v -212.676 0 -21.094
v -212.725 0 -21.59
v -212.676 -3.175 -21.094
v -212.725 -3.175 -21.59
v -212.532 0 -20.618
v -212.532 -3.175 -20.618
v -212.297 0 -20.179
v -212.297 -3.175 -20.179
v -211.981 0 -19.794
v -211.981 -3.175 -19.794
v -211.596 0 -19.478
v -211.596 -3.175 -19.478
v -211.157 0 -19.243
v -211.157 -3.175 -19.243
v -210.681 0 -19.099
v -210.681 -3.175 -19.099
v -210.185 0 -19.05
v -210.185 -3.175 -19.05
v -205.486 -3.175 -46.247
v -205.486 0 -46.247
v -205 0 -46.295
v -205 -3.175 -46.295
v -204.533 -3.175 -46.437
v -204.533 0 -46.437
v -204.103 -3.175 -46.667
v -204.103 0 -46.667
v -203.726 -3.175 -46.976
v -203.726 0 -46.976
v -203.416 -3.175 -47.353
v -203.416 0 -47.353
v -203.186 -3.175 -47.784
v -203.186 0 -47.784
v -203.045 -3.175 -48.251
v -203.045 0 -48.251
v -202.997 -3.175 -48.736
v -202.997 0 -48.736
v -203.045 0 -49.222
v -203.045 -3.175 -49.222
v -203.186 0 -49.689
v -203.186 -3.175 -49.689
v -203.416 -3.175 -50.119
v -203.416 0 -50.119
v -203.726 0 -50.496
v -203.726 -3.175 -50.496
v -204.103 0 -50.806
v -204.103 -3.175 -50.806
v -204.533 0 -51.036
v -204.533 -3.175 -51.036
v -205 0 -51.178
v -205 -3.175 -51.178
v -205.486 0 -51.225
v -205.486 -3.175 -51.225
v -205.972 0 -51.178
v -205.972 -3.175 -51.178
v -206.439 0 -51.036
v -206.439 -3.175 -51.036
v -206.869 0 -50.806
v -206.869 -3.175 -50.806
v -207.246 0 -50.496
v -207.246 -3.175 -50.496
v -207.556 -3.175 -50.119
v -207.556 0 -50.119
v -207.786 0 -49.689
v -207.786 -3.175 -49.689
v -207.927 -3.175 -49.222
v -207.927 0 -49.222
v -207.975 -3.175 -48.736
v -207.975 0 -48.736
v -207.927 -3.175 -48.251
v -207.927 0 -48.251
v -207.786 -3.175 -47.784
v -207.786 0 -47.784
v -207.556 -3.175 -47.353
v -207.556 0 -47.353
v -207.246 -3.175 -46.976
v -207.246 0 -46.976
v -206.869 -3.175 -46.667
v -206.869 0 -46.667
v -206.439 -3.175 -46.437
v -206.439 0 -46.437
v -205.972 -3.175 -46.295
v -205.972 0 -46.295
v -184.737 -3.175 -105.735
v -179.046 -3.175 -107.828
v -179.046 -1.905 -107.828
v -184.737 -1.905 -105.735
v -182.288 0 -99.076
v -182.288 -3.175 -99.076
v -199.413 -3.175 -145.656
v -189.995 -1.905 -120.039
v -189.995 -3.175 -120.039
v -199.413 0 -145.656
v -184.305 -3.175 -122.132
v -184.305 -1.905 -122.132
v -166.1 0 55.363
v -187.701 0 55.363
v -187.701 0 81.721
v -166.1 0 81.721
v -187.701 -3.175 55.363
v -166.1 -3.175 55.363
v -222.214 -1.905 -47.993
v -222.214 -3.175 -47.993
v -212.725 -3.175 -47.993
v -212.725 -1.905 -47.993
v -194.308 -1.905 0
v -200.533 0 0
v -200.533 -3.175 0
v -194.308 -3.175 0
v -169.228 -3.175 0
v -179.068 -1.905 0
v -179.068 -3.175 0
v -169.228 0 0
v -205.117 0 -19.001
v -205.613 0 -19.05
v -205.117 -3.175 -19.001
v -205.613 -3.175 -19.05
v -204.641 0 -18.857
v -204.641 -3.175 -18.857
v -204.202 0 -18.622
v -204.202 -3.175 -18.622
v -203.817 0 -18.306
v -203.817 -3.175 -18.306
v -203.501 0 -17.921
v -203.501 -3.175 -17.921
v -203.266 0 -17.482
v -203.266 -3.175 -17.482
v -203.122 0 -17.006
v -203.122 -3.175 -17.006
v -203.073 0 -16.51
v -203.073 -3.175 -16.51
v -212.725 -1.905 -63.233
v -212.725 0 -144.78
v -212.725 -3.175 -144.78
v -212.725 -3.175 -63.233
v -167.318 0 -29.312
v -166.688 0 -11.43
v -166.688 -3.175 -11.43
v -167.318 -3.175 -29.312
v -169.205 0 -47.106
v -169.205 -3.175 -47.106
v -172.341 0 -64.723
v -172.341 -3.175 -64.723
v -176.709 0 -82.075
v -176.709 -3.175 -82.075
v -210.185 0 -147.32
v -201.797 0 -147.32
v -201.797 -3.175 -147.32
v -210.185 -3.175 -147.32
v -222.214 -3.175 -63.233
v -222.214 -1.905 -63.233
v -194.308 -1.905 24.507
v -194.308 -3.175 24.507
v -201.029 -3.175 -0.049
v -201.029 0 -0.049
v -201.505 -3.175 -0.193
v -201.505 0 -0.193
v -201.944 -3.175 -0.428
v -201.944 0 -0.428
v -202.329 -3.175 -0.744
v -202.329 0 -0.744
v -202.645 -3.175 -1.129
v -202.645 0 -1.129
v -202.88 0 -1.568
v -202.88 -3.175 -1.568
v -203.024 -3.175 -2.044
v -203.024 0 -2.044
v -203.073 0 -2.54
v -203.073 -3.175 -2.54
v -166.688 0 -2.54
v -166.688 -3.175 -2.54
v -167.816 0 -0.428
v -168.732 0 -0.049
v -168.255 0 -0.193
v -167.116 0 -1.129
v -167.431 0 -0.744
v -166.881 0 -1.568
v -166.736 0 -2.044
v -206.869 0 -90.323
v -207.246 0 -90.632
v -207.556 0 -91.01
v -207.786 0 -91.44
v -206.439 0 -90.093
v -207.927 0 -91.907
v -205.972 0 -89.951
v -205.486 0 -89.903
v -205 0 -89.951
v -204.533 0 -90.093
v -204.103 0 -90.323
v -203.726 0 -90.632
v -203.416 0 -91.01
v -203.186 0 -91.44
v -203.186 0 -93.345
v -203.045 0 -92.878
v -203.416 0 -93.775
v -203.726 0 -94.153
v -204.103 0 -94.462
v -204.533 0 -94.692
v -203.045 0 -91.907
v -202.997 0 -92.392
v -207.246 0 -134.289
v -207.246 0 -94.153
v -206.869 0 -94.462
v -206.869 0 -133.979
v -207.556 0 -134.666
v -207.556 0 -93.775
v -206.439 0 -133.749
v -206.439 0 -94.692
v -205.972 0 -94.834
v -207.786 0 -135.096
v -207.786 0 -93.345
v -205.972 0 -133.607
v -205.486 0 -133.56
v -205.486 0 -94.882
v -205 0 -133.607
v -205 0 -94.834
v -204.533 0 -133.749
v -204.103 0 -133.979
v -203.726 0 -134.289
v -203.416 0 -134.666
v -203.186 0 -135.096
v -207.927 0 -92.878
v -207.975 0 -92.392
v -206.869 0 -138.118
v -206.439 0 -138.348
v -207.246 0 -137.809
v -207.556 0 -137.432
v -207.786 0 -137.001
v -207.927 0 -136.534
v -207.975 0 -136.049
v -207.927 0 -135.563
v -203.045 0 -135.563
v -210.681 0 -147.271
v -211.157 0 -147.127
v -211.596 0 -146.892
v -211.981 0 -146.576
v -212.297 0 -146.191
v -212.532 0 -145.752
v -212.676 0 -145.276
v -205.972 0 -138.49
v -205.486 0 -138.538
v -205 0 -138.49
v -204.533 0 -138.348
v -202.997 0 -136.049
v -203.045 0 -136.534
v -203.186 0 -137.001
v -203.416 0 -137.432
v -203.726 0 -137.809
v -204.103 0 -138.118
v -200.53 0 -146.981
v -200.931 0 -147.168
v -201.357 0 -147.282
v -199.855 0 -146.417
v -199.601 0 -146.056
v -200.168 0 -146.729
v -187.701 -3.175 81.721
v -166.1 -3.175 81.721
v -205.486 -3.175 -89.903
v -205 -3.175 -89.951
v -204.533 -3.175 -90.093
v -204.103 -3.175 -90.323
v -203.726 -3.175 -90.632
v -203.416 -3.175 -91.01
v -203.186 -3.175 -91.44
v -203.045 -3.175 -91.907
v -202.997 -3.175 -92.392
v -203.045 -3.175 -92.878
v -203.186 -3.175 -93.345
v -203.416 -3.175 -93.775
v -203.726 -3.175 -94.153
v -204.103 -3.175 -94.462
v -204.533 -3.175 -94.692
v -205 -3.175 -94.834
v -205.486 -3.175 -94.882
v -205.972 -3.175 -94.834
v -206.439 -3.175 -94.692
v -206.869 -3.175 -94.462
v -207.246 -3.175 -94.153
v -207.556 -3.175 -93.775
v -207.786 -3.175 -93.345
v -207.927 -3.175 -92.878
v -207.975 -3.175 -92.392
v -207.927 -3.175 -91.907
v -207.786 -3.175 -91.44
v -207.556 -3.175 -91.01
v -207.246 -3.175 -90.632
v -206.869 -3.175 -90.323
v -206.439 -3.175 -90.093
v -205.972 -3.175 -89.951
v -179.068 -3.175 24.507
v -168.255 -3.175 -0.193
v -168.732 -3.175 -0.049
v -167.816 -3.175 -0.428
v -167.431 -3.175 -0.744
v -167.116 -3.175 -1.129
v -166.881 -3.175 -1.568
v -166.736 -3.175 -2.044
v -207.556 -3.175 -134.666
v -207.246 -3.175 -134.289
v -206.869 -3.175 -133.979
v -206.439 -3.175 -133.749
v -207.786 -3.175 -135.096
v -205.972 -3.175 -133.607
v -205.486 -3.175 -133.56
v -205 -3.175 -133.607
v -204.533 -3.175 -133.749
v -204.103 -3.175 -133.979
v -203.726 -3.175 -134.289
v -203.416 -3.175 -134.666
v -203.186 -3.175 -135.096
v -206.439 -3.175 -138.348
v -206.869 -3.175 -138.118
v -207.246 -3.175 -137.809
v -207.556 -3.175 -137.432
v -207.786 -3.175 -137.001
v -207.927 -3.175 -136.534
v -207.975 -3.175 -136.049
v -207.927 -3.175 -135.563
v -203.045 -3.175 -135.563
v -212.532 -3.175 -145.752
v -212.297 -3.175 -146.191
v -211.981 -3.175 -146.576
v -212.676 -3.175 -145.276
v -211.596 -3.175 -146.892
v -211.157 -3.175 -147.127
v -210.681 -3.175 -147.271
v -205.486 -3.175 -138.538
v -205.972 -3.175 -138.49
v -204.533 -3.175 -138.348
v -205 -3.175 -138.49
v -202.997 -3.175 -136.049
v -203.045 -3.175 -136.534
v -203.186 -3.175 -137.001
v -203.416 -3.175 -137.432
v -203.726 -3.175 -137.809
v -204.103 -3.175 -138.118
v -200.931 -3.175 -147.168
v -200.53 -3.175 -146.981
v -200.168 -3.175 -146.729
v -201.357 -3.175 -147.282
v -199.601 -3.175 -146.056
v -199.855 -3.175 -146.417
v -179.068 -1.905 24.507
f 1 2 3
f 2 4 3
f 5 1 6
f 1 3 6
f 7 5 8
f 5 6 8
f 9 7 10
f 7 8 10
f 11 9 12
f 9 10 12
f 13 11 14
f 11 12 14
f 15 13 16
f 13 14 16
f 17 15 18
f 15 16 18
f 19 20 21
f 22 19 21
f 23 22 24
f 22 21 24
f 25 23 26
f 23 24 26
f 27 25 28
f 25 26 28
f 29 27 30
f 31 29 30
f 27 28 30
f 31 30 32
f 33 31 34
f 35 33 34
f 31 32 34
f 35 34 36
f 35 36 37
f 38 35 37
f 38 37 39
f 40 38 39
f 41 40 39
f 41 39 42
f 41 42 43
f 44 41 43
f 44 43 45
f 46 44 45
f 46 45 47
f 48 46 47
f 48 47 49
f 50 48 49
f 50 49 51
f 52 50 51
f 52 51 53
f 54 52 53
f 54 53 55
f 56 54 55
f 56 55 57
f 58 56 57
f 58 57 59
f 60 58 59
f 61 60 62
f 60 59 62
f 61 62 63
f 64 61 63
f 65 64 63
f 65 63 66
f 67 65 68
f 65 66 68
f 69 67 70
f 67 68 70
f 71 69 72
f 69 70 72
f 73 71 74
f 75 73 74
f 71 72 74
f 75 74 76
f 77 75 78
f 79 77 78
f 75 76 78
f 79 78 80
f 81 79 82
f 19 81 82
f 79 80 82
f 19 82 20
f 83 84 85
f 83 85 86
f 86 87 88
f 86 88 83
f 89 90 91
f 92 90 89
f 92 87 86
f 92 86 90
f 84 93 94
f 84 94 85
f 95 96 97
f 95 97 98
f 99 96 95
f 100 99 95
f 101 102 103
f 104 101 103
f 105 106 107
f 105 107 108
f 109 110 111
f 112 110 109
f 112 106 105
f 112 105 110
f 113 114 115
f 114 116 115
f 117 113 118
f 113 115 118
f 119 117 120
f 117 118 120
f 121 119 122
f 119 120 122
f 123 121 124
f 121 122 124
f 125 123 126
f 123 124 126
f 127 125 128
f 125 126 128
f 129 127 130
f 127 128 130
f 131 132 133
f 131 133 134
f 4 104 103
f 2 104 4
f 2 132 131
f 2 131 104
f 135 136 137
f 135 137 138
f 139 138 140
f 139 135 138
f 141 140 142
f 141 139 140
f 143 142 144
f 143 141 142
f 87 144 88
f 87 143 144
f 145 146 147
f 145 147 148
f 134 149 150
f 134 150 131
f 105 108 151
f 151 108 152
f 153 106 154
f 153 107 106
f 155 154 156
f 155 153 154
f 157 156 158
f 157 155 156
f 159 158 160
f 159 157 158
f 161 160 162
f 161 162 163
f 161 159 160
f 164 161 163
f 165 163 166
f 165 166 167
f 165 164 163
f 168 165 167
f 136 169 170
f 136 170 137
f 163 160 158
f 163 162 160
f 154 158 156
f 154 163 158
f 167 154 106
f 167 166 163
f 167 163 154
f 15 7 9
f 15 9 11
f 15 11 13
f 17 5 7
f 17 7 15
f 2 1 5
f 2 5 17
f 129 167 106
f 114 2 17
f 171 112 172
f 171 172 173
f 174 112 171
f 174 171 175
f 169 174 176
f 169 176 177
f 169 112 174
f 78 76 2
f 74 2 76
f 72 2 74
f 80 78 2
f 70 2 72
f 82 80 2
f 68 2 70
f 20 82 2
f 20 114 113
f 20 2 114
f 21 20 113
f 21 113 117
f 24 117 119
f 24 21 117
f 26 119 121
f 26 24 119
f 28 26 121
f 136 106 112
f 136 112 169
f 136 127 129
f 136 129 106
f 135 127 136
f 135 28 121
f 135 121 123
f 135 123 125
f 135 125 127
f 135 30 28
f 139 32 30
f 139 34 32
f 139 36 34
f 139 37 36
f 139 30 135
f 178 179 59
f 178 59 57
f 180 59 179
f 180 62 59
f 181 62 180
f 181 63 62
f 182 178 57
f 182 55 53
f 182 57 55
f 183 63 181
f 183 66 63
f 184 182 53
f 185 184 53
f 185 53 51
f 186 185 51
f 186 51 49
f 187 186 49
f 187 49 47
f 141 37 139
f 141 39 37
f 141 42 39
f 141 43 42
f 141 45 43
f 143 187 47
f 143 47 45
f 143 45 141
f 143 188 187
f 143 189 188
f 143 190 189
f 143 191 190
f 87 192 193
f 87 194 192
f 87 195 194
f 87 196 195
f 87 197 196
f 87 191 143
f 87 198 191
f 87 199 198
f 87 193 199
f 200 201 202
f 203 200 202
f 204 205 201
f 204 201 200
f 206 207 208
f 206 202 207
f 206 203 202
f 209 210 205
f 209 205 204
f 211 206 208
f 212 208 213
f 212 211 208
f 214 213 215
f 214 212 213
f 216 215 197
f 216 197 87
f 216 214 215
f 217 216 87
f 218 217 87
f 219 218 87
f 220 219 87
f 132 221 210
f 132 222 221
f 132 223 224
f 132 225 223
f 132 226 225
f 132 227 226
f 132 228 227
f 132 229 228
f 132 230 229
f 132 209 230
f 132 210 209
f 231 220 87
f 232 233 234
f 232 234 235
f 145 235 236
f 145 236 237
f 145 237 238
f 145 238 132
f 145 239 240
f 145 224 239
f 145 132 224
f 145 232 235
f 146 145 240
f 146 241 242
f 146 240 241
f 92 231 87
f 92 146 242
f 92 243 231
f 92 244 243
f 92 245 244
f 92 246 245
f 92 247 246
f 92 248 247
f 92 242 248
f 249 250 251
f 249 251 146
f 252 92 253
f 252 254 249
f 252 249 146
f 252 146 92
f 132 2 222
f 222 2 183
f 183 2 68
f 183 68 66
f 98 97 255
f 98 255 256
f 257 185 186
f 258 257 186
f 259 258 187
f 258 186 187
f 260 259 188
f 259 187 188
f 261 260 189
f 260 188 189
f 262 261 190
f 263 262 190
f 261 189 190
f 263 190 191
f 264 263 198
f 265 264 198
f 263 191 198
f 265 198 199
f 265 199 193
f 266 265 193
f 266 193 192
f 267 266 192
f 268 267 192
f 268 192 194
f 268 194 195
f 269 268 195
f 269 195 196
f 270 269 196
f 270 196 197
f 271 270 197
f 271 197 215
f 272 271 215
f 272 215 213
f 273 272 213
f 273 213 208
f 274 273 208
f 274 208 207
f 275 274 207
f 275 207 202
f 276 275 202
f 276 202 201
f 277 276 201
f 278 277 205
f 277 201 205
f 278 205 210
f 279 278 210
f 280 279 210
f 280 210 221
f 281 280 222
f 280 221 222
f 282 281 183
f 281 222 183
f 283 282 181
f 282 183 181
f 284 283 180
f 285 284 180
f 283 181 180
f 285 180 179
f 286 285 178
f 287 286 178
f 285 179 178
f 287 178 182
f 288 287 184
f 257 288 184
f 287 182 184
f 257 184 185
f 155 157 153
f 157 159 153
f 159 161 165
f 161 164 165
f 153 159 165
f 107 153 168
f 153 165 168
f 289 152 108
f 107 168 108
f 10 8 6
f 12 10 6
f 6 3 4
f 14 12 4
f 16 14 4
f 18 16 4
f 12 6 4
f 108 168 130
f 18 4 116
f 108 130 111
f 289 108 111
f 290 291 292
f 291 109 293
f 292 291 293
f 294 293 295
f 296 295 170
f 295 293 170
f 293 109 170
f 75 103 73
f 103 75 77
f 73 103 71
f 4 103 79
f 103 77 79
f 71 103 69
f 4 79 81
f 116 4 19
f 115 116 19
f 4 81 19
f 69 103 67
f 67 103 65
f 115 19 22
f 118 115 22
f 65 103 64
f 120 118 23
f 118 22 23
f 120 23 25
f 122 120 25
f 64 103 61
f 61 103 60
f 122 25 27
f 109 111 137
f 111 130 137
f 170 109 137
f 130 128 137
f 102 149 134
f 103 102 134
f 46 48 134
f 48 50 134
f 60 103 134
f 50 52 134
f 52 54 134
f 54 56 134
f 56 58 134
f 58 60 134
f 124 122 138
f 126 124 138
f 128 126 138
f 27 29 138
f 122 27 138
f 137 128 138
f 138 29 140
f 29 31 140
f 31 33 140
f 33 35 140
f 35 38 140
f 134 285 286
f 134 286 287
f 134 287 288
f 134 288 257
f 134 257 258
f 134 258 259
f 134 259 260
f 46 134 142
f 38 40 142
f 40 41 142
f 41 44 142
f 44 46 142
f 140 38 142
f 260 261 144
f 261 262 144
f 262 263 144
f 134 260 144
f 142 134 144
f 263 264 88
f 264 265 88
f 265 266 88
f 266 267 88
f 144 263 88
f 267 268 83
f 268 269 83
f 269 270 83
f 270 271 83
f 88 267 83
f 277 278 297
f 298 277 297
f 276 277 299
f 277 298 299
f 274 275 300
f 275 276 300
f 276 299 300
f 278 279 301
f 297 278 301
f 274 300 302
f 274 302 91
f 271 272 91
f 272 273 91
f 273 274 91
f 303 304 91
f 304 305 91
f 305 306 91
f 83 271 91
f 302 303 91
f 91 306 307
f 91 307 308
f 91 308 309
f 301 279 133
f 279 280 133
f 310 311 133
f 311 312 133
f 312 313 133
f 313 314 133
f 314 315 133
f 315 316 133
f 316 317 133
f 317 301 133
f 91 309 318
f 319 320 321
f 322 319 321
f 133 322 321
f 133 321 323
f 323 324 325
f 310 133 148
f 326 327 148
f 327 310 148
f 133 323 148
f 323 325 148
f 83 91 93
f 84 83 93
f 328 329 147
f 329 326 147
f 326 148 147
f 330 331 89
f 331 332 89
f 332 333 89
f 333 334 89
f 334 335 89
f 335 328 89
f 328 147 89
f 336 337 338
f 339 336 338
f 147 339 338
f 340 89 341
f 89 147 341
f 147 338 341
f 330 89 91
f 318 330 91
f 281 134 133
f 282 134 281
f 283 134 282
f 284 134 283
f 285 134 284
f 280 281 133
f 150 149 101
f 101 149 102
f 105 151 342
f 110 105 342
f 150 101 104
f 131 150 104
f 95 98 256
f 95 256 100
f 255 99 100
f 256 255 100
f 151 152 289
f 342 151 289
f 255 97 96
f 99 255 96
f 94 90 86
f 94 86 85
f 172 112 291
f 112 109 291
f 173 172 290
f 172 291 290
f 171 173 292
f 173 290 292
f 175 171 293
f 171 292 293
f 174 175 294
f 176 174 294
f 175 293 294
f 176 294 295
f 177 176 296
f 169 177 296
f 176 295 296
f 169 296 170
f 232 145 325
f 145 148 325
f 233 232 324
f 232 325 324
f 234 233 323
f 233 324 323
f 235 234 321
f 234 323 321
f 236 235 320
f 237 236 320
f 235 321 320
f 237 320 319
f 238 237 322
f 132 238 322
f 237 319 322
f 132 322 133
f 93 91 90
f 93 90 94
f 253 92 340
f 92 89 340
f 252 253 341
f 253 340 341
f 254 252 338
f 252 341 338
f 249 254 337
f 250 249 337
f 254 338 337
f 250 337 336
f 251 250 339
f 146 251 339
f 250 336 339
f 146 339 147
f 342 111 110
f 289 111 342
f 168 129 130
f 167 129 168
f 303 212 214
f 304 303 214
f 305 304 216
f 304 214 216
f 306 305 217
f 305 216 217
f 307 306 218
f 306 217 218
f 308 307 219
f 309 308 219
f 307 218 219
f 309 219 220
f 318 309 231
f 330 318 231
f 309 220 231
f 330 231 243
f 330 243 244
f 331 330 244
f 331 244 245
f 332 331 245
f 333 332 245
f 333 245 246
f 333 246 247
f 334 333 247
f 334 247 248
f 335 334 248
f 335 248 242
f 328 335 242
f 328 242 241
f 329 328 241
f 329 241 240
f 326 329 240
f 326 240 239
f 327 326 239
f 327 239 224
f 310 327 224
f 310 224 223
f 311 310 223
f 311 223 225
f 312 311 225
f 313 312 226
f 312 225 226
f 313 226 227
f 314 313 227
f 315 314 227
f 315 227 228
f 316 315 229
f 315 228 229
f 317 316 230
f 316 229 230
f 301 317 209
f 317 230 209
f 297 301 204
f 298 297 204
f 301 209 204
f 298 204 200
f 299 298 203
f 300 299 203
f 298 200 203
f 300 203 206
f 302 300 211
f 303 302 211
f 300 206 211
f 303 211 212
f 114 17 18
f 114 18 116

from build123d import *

# Parameters (mm, degrees)
BASE_FLANGE1_DEPTH  = 3.175
FILLET1_R           = 2.54
SKETCH9_R           = 2.4892
CUT_EXTRUDE1_DEPTH  = 259.776329385
SKETCH10_W          = 21.601588443
SKETCH10_H          = 26.357827305
BOSS_EXTRUDE1_DEPTH = 3.175
SKETCH11_W          = 15.24
SKETCH11_H          = 24.506960717
SKETCH11_W_2        = 9.488699203
SKETCH11_H_2        = 15.24
BOSS_EXTRUDE2_DEPTH = 1.27


# Sheet-metal steps are written as plain solids
with BuildPart() as part:
    # Sketch1 → Base-Flange1 (new body)
    with BuildSketch(Plane(origin=(0, 0, 0), x_dir=(1, 0, 0), z_dir=(0, 1, 0))):
        with BuildLine():
            Line((-203.073, 0), (-166.6875, 0))
            Line((-166.6875, 0), (-166.6875, 11.43))
            ThreePointArc((-166.6875, 11.43), (-170.61814947, 55.942020012), (-182.288444296, 99.07639319))
            Line((-182.288444296, 99.07639319), (-200.025, 147.32))
            Line((-200.025, 147.32), (-212.725, 147.32))
            Line((-212.725, 147.32), (-212.725, 19.05))
            Line((-212.725, 19.05), (-203.073, 19.05))
            Line((-203.073, 19.05), (-203.073, 0))
        make_face()
    extrude(amount=-BASE_FLANGE1_DEPTH)

    # Fillet1
    fillet1_edges = [part.edges().sort_by_distance(p)[0] for p in [
        (-166.6875, -1.5875, 0),
        (-203.073, -1.5875, 0),
        (-203.073, -1.5875, -19.05),
        (-212.725, -1.5875, -19.05),
        (-212.725, -1.5875, -147.32),
        (-200.025, -1.5875, -147.32),
    ]]
    fillet(fillet1_edges, radius=FILLET1_R)

    # Sketch9 → Cut-Extrude1 (cut, through all)
    with BuildSketch(Plane(origin=(0, 0, 0), x_dir=(1, 0, 0), z_dir=(0, 1, 0))):
        with Locations(Location((-205.486, 48.73625, 0), (0, 0, 270))):
            Circle(SKETCH9_R)
        with Locations(Location((-205.486, 92.3925, 0), (0, 0, 270))):
            Circle(SKETCH9_R)
        with Locations(Location((-205.486, 136.04875, 0), (0, 0, 270))):
            Circle(SKETCH9_R)
    extrude(amount=-CUT_EXTRUDE1_DEPTH, mode=Mode.SUBTRACT)

    # Sketch11 → Boss-Extrude2 (add)
    with BuildSketch(Plane.XZ.offset(3.175)):
        with Locations((-186.687788789, 12.253480359)):
            Rectangle(SKETCH11_W, SKETCH11_H)
        with Locations((-217.469349602, -55.613441741)):
            Rectangle(SKETCH11_W_2, SKETCH11_H_2)
        Polygon((-184.736614771, -105.73544108), (-189.995398363, -120.039384422), (-184.304516727, -122.131612715), (-179.045733136, -107.827669373), align=None)
    extrude(amount=-BOSS_EXTRUDE2_DEPTH)


with BuildPart() as body_2:
    # Sketch10 → Boss-Extrude1 (new body)
    with BuildSketch(Plane(origin=(0, 0, 0), x_dir=(1, 0, 0), z_dir=(0, 1, 0))):
        with Locations((-176.900603012, -68.541829584)):
            Rectangle(SKETCH10_W, SKETCH10_H)
    extrude(amount=-BOSS_EXTRUDE1_DEPTH)


solid = Compound([part.part, body_2.part])
